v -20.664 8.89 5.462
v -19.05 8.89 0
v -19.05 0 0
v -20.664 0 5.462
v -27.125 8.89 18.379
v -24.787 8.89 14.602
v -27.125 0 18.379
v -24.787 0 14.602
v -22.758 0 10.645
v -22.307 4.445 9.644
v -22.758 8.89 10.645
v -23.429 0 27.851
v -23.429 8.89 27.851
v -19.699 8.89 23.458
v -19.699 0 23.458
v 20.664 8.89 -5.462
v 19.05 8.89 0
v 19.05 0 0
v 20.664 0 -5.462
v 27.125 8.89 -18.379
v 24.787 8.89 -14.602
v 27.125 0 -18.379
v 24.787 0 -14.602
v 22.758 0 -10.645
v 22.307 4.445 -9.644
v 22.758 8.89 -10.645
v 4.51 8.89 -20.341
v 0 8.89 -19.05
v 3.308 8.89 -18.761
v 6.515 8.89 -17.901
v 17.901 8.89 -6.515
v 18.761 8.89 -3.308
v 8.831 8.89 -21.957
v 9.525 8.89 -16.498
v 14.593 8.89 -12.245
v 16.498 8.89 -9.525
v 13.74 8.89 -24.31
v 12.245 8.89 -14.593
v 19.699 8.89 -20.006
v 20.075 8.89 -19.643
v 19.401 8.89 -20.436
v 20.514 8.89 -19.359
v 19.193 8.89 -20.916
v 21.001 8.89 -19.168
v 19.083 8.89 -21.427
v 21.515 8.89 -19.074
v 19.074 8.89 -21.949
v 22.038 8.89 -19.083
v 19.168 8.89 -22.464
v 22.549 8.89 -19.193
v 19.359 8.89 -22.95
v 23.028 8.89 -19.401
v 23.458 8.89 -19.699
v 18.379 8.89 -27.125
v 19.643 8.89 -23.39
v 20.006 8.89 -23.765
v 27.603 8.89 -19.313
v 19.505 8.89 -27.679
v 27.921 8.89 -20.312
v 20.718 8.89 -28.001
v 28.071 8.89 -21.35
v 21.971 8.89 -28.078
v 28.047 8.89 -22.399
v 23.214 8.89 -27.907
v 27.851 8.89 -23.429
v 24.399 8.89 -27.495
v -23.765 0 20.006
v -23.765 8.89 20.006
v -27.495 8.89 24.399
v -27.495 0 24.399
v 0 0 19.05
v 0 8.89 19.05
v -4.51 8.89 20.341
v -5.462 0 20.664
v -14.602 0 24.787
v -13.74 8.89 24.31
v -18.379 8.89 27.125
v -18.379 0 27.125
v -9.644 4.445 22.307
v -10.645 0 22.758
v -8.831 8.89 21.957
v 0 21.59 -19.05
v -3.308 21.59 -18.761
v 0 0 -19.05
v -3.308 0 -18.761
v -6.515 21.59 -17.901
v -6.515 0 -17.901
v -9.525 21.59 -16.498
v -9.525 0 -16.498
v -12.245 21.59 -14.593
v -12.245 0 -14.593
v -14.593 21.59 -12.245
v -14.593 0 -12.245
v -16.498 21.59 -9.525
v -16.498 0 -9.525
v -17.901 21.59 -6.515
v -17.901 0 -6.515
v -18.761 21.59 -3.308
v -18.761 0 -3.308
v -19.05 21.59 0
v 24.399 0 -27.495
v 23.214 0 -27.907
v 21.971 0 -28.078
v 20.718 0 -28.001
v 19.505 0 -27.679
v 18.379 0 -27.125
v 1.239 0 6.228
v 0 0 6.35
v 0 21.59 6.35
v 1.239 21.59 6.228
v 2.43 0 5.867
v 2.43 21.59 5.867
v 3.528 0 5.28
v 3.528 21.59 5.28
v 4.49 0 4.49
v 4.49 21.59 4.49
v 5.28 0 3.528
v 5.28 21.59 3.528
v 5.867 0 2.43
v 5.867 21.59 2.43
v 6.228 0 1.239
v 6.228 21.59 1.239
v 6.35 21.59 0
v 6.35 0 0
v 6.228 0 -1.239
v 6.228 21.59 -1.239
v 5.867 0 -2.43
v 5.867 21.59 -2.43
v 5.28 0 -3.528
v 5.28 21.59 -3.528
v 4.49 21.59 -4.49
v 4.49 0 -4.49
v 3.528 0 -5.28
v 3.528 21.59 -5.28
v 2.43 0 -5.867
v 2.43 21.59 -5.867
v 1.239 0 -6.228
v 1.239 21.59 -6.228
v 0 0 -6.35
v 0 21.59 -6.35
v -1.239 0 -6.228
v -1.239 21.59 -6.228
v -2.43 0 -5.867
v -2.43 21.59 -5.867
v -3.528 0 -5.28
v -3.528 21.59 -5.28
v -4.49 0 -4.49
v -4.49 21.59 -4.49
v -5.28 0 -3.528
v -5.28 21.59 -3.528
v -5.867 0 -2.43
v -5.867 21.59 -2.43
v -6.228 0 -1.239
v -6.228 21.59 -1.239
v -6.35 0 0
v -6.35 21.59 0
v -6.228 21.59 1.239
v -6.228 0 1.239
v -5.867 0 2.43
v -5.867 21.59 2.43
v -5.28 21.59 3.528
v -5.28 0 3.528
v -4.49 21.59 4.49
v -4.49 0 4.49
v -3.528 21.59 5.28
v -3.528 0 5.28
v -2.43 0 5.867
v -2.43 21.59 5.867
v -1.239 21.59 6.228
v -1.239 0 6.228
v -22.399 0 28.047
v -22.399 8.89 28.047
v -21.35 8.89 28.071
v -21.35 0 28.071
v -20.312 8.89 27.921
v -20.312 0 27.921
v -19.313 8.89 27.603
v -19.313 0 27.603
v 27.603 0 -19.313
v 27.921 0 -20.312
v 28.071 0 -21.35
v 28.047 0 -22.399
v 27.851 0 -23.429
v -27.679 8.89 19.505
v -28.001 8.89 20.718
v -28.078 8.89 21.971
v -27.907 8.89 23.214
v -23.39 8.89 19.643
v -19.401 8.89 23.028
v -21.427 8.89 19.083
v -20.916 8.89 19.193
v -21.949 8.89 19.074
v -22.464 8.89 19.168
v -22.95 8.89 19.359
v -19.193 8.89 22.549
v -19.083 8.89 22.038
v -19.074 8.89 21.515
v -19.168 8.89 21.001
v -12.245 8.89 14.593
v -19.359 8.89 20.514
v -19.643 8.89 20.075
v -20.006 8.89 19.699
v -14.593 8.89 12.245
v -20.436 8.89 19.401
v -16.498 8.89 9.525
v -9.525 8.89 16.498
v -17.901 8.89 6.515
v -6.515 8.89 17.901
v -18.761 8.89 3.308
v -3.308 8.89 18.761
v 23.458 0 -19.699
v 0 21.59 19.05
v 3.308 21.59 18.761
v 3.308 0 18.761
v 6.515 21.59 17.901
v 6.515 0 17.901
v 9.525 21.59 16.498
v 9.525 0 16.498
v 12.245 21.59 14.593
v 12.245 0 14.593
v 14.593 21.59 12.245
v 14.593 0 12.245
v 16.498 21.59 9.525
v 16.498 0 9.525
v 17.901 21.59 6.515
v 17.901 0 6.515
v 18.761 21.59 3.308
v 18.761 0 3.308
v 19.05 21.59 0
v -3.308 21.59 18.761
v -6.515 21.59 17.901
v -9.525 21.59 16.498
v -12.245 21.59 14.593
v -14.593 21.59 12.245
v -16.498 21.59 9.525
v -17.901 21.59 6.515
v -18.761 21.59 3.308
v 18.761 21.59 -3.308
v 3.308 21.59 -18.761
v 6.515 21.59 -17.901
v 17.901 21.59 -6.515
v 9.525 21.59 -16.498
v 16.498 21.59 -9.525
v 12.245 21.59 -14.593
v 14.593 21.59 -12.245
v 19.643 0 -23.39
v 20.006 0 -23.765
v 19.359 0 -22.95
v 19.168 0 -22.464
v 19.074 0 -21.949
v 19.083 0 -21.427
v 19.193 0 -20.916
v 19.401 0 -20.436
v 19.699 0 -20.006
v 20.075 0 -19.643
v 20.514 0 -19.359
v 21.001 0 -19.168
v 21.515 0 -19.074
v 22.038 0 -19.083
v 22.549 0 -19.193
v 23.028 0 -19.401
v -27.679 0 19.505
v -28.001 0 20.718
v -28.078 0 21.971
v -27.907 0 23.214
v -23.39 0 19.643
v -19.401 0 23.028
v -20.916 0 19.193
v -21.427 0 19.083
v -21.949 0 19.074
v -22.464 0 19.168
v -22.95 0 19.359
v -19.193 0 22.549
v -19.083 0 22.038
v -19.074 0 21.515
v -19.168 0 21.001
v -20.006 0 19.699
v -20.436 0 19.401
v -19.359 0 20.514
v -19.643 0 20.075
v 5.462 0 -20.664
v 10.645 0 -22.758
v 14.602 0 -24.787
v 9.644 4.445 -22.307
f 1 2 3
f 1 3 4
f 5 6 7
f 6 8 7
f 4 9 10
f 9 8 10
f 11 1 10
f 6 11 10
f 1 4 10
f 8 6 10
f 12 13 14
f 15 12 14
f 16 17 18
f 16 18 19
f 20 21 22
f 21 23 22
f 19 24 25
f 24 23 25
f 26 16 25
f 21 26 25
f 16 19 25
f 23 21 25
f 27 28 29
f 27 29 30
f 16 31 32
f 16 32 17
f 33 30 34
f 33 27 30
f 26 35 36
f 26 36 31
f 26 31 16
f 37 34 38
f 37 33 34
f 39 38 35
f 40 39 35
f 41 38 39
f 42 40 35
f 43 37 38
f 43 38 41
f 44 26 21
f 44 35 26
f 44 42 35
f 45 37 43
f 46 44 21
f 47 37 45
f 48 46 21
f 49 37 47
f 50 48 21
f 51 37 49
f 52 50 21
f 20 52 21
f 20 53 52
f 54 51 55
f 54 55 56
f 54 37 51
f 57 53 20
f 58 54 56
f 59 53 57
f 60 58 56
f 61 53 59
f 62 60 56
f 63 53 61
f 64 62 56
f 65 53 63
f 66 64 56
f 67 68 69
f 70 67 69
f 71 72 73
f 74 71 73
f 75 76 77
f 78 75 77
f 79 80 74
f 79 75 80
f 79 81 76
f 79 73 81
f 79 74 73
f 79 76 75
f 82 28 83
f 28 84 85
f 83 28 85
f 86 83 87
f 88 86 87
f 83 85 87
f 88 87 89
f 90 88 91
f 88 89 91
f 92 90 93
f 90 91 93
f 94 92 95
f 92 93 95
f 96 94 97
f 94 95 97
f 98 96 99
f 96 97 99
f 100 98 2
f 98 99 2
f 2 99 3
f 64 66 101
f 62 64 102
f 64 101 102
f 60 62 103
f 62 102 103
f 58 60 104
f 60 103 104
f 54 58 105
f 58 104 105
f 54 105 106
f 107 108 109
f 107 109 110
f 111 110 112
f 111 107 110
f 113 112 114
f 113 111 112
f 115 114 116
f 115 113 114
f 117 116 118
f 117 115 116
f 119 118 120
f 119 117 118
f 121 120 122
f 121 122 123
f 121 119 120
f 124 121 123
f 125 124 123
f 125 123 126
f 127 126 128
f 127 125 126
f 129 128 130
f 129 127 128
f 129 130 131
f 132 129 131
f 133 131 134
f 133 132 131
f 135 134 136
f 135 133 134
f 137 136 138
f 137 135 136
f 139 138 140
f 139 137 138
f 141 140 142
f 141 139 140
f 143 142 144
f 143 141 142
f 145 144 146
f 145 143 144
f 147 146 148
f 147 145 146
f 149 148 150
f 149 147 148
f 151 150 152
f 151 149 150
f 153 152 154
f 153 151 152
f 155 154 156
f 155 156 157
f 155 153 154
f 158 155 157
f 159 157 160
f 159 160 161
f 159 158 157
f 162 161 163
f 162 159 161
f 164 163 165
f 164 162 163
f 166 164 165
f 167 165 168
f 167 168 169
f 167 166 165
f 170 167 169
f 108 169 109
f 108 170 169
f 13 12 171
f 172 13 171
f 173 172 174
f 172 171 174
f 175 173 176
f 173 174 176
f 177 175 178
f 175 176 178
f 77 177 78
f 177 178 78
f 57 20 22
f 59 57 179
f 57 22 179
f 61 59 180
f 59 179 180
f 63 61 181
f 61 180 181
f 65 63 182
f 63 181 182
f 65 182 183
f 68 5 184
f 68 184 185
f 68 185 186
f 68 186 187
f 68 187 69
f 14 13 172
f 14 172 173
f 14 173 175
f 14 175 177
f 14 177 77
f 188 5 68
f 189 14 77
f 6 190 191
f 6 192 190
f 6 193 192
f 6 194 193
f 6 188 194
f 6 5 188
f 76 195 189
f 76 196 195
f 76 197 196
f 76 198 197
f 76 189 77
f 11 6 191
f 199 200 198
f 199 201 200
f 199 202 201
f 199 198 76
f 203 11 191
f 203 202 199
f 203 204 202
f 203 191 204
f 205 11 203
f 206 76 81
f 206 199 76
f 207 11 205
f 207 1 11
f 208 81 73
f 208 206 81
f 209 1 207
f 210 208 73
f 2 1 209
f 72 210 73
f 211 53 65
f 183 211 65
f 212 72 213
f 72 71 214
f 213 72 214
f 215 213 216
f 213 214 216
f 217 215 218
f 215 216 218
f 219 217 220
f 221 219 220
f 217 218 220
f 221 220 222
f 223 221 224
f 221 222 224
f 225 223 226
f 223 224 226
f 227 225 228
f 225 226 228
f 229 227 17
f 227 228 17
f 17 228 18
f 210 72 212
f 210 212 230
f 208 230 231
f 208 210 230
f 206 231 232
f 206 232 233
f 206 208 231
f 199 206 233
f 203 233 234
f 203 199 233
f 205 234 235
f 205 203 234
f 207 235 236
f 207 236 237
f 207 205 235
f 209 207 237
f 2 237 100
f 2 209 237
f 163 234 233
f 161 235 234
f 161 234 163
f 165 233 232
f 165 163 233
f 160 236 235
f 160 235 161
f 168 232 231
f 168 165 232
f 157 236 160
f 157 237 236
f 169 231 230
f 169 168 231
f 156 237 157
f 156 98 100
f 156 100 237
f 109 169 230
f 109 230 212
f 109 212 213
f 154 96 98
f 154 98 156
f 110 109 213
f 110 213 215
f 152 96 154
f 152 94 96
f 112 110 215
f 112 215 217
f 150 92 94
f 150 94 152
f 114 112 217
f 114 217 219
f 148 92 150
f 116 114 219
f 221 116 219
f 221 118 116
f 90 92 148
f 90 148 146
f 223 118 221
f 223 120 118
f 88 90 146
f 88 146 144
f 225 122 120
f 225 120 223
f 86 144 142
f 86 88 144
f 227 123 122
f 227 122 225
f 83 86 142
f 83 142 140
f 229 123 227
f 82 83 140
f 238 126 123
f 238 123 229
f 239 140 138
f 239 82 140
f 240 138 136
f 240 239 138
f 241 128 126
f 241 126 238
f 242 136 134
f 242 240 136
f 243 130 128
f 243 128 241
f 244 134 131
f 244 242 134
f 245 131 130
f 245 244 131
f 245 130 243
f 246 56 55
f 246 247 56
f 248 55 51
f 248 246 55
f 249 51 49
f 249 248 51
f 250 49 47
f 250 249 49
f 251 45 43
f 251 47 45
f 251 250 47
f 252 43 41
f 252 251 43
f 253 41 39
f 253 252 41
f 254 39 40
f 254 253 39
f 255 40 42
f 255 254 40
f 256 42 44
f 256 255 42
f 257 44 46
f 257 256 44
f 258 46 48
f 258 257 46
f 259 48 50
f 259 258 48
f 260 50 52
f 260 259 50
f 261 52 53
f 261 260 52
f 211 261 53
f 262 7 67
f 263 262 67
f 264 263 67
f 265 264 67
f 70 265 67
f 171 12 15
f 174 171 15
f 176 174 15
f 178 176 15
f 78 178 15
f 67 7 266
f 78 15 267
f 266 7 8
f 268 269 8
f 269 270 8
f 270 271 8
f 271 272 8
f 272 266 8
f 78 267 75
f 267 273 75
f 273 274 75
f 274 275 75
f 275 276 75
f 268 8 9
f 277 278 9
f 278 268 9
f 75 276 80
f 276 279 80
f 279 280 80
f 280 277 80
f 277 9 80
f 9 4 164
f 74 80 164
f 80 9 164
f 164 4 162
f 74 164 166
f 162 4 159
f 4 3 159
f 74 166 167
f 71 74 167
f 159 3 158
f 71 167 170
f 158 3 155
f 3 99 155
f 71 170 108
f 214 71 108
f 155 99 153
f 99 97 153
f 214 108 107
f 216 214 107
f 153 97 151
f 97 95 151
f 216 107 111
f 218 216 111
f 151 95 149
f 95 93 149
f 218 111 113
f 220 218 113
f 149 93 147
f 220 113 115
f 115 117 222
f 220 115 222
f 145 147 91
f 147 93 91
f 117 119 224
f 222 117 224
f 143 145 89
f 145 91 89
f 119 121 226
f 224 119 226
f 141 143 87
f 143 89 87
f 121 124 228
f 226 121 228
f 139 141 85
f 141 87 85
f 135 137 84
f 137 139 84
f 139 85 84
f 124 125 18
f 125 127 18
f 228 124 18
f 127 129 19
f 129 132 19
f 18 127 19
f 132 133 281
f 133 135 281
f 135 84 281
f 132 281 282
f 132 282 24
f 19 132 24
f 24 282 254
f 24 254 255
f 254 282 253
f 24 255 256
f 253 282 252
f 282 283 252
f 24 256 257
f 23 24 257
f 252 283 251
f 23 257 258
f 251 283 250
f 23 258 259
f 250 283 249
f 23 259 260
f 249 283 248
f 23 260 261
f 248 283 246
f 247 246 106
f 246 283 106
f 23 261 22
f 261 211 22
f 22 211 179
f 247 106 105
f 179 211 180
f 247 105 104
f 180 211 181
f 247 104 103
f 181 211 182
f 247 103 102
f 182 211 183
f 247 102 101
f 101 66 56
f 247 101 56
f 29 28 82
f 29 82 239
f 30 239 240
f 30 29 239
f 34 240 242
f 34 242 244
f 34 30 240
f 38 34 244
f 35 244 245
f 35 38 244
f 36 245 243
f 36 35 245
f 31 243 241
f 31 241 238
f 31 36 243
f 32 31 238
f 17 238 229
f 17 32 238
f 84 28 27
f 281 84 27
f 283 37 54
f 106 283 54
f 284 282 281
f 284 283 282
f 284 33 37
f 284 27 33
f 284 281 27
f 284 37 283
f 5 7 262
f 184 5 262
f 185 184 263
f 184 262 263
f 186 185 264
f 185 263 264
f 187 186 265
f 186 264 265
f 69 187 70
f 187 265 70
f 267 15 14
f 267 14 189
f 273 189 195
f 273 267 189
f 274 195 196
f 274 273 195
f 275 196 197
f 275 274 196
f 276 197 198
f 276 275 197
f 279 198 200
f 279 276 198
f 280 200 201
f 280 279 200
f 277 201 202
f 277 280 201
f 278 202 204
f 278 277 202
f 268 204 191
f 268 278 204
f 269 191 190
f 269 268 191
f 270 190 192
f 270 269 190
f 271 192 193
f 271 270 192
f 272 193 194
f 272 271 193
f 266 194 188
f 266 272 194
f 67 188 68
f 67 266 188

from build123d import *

# Parameters (mm, degrees)
SKETCH1_R           = 19.05
SKETCH1_R_2         = 6.35
SKETCH1_R_3         = 2.667
BOSS_EXTRUDE1_DEPTH = 21.59
CUT_EXTRUDE1_START  = -12.7
SKETCH2_R           = 2.667
CUT_EXTRUDE1_DEPTH  = 12.7
CUT_EXTRUDE2_DEPTH  = 42.695469184
CUT_EXTRUDE3_DEPTH  = 42.695469184


with BuildPart() as part:
    # Sketch1 → Boss-Extrude1 (new body)
    # profile 1 of 3: a face of its own
    with BuildSketch(Plane(origin=(0, 0, 0), x_dir=(1, 0, 0), z_dir=(0, 1, 0))):
        Circle(SKETCH1_R)
        with Locations(Location((0, 0, 0), (0, 0, 270))):
            Circle(SKETCH1_R_2, mode=Mode.SUBTRACT)
    # profile 2 of 3: a face of its own
    with BuildSketch(Plane(origin=(0, 0, 0), x_dir=(1, 0, 0), z_dir=(0, 1, 0))):
        with BuildLine():
            add(Edge.make_bspline(
                [(0, -19.05), (-10.097544885, -21.525800279), (-18.379445047, -27.124937251)],
                knots=[0, 0, 0, 0.663461898, 0.663461898, 0.663461898], degree=2))
            ThreePointArc((0, -19.05), (-13.470384182, -13.470384182), (-19.05, 0))
            add(Edge.make_bspline(
                [(-19.05, 0), (-21.525800279, -10.097544885), (-27.124937251, -18.379445047)],
                knots=[0, 0, 0, 0.663461898, 0.663461898, 0.663461898], degree=2))
            ThreePointArc((-27.124937251, -18.379445047), (-26.222347874, -26.222347874), (-18.379445047, -27.124937251))
        make_face()
        with Locations(Location((-21.732219813, -21.732219813, 0), (0, 0, 270))):
            Circle(SKETCH1_R_3, mode=Mode.SUBTRACT)
    # profile 3 of 3: a face of its own
    with BuildSketch(Plane(origin=(0, 0, 0), x_dir=(1, 0, 0), z_dir=(0, 1, 0))):
        with BuildLine():
            ThreePointArc((0, 19.05), (13.470384182, 13.470384182), (19.05, 0))
            add(Edge.make_bspline(
                [(19.05, 0), (21.525800279, 10.097544885), (27.124937251, 18.379445047)],
                knots=[0, 0, 0, 0.663461898, 0.663461898, 0.663461898], degree=2))
            ThreePointArc((27.124937251, 18.379445047), (26.222347874, 26.222347874), (18.379445047, 27.124937251))
            add(Edge.make_bspline(
                [(0, 19.05), (10.097544885, 21.525800279), (18.379445047, 27.124937251)],
                knots=[0, 0, 0, 0.663461898, 0.663461898, 0.663461898], degree=2))
        make_face()
        with Locations(Location((21.732219813, 21.732219813, 0), (0, 0, 270))):
            Circle(SKETCH1_R_3, mode=Mode.SUBTRACT)
    extrude(amount=BOSS_EXTRUDE1_DEPTH)

    # Sketch2 → Cut-Extrude1 (cut)
    # profile 1 of 2: a face of its own
    with BuildSketch(Plane(origin=(0, 21.59, 0), x_dir=(1, 0, 0), z_dir=(0, 1, 0)).offset(CUT_EXTRUDE1_START)):
        with BuildLine():
            add(Edge.make_bspline(
                [(-18.379445047, -27.124937251), (-10.097544885, -21.525800279), (0, -19.05)],
                knots=[0, 0, 0, 0.663461898, 0.663461898, 0.663461898], degree=2))
            ThreePointArc((0, -19.05), (-13.470384182, -13.470384182), (-19.05, 0))
            add(Edge.make_bspline(
                [(-19.05, 0), (-21.525800279, -10.097544885), (-27.124937251, -18.379445047)],
                knots=[0, 0, 0, 0.663461898, 0.663461898, 0.663461898], degree=2))
            ThreePointArc((-27.124937251, -18.379445047), (-26.222347874, -26.222347874), (-18.379445047, -27.124937251))
        make_face()
        with Locations(Location((-21.732219813, -21.732219813, 0), (0, 0, 270))):
            Circle(SKETCH2_R, mode=Mode.SUBTRACT)
    # profile 2 of 2: a face of its own
    with BuildSketch(Plane(origin=(0, 21.59, 0), x_dir=(1, 0, 0), z_dir=(0, 1, 0)).offset(CUT_EXTRUDE1_START)):
        with BuildLine():
            ThreePointArc((0, 19.05), (13.470384182, 13.470384182), (19.05, 0))
            add(Edge.make_bspline(
                [(19.05, 0), (21.525800279, 10.097544885), (27.124937251, 18.379445047)],
                knots=[0, 0, 0, 0.663461898, 0.663461898, 0.663461898], degree=2))
            ThreePointArc((27.124937251, 18.379445047), (26.222347874, 26.222347874), (18.379445047, 27.124937251))
            add(Edge.make_bspline(
                [(18.379445047, 27.124937251), (10.097544885, 21.525800279), (0, 19.05)],
                knots=[0, 0, 0, 0.663461898, 0.663461898, 0.663461898], degree=2))
        make_face()
        with Locations(Location((21.732219813, 21.732219813, 0), (0, 0, 270))):
            Circle(SKETCH2_R, mode=Mode.SUBTRACT)
    extrude(amount=CUT_EXTRUDE1_DEPTH, mode=Mode.SUBTRACT)

    # Sketch3 → Cut-Extrude2 (cut, through all)
    with BuildSketch(Plane(origin=(0, 8.89, 0), x_dir=(1, 0, 0), z_dir=(0, 1, 0))):
        with BuildLine():
            Line((24.399219813, 27.494997876), (20.006137413, 23.765327914))
            ThreePointArc((20.006137413, 23.765327914), (22.852359813, 24.152586599), (24.399219813, 21.732219813))
            ThreePointArc((24.399219813, 21.732219813), (24.152586599, 20.612079813), (23.458302213, 19.699111712))
            Line((23.458302213, 19.699111712), (27.851384613, 23.428781675))
            ThreePointArc((27.851384613, 23.428781675), (26.572953386, 25.841939813), (24.399219813, 27.494997876))
        make_face()
    extrude(amount=-CUT_EXTRUDE2_DEPTH, mode=Mode.SUBTRACT)

    # Sketch4 → Cut-Extrude3 (cut, through all)
    with BuildSketch(Plane(origin=(0, 8.89, 0), x_dir=(1, 0, 0), z_dir=(0, 1, 0))):
        with BuildLine():
            ThreePointArc((-19.699111712, -23.458302213), (-23.458302213, -23.765327914), (-23.765327914, -20.006137413))
            Line((-23.765327914, -20.006137413), (-27.494997876, -24.399219813))
            ThreePointArc((-27.494997876, -24.399219813), (-25.841939813, -26.572953386), (-23.428781675, -27.851384613))
            Line((-23.428781675, -27.851384613), (-19.699111712, -23.458302213))
        make_face()
    extrude(amount=-CUT_EXTRUDE3_DEPTH, mode=Mode.SUBTRACT)


solid = part.part
